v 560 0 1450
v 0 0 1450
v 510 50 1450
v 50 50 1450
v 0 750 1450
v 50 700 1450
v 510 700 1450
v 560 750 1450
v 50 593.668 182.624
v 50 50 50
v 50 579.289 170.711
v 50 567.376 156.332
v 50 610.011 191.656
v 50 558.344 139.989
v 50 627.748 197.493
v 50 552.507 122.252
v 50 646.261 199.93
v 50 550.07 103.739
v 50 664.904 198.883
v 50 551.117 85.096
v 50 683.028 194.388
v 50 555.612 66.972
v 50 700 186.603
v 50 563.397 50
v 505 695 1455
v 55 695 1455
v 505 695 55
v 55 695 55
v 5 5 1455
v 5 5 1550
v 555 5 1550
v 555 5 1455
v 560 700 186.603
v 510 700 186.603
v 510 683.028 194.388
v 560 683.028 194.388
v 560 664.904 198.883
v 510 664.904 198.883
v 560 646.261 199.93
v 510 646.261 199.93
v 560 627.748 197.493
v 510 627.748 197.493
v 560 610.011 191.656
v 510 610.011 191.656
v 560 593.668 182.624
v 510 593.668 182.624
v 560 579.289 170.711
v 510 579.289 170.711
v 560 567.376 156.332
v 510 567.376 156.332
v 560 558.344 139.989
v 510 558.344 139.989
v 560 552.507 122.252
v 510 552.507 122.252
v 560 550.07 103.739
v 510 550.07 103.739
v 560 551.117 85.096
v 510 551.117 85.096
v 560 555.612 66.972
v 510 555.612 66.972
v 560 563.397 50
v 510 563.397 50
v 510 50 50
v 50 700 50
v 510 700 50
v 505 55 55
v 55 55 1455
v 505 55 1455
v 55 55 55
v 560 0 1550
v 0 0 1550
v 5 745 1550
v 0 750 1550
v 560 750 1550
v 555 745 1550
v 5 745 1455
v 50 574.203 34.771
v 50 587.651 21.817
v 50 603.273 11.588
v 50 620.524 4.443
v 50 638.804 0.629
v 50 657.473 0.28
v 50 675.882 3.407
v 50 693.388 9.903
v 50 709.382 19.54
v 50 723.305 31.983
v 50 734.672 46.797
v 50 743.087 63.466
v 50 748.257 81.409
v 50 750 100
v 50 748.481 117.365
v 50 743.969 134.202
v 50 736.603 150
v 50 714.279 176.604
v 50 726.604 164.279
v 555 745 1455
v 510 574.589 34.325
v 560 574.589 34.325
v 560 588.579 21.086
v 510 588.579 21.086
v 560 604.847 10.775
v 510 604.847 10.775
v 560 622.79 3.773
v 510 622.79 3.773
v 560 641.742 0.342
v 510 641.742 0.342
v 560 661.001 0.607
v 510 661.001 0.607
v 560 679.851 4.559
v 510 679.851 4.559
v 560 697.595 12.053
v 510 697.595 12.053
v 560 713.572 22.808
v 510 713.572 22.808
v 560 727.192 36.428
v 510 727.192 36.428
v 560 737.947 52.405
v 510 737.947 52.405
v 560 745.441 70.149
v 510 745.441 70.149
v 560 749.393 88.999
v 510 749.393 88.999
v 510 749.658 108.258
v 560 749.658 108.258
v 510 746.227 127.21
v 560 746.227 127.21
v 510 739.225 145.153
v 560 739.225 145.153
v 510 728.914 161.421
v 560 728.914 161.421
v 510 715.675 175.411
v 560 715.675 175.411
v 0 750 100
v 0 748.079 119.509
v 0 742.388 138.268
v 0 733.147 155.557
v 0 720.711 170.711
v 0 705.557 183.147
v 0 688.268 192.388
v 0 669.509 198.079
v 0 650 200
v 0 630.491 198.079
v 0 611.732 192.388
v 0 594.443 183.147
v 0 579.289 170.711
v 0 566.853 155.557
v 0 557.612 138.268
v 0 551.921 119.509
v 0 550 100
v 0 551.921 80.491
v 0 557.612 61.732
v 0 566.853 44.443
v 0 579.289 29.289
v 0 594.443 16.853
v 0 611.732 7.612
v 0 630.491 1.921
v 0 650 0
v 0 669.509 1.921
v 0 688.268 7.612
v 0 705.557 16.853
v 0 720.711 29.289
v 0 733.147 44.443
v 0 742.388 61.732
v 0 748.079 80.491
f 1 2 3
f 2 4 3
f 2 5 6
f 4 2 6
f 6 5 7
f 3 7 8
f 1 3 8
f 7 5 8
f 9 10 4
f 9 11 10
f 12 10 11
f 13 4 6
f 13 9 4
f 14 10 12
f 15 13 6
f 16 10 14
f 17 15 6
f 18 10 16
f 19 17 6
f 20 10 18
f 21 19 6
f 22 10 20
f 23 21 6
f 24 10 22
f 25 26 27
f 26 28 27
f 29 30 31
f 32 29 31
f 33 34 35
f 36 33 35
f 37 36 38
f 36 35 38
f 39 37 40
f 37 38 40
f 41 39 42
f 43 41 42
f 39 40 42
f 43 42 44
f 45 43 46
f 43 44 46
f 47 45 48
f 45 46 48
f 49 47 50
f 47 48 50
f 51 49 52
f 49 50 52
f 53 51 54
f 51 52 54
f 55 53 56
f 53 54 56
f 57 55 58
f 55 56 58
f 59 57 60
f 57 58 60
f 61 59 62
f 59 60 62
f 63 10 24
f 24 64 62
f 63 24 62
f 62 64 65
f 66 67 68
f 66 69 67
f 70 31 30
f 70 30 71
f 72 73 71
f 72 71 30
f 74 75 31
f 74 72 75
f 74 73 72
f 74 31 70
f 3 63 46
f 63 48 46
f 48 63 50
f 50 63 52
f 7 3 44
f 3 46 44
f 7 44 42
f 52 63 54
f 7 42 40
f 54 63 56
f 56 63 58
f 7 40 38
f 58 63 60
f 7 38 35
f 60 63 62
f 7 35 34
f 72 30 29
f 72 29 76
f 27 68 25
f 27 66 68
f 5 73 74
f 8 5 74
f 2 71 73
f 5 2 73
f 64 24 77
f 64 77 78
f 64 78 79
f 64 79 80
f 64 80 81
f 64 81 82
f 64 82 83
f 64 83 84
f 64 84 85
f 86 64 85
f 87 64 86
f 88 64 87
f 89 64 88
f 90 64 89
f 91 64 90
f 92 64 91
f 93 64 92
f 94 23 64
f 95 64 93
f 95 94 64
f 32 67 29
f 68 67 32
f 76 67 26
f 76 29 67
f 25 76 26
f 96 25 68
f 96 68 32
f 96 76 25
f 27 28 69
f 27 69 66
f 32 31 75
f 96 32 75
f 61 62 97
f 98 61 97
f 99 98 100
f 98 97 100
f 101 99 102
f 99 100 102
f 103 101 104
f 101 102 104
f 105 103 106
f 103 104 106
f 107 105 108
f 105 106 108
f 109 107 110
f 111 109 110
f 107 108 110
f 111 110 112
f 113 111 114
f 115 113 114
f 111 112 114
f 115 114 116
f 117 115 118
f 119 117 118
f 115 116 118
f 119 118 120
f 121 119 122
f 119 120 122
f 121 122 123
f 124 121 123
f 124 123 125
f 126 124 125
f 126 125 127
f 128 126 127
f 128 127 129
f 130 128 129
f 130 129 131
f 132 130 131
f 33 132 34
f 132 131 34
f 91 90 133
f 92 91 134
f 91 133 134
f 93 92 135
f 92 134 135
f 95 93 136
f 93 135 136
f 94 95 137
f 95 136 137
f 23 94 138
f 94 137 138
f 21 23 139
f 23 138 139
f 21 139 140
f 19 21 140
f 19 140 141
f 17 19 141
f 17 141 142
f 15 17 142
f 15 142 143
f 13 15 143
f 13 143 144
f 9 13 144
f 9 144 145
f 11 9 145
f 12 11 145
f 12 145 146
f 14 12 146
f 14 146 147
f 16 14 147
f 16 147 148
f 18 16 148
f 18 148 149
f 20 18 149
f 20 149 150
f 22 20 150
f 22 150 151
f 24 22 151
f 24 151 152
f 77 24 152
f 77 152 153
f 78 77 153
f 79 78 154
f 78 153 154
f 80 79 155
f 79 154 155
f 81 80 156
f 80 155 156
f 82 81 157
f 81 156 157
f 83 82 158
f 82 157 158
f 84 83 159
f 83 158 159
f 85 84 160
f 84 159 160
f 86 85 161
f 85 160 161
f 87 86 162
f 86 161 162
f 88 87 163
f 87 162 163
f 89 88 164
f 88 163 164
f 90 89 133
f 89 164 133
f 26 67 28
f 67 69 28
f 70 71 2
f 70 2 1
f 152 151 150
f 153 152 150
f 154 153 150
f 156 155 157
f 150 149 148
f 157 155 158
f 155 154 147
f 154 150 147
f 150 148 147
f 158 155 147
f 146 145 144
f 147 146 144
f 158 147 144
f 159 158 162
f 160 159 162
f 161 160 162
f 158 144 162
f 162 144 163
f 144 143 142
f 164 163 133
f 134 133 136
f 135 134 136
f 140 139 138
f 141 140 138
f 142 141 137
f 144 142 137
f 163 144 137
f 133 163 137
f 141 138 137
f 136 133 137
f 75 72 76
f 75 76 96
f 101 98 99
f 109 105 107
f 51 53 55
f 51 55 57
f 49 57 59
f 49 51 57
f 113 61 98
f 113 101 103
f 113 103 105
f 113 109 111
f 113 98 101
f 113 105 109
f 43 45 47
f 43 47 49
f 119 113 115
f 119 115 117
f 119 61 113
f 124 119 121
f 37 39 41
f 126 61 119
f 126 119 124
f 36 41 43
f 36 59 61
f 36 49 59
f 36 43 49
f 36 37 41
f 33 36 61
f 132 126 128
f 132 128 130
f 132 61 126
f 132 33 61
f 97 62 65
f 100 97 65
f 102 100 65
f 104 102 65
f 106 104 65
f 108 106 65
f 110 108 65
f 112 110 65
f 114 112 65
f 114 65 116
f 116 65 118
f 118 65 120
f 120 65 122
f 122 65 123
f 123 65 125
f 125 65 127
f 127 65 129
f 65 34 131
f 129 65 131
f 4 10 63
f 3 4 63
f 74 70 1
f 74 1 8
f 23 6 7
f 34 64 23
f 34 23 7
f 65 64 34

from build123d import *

# Parameters (mm, degrees)
F1_W     = 460
F1_H     = 650
F2_DEPTH = 1500
F3_W     = 560
F3_H     = 750
F3_W_2   = 460
F3_H_2   = 650
F4_DEPTH = 100
F5_T     = -5
F6_R     = 100
F7_DEPTH = 50
F9_DEPTH = 50


with BuildPart() as f2:
    # F1 (on offset) → F2 (new body)
    with BuildSketch(Plane.XY.offset(50)):
        with Locations((280, 375)):
            Rectangle(F1_W, F1_H)
    extrude(amount=F2_DEPTH)

    # F3 (on face) → F4 (join)
    with BuildSketch(Plane.XY.offset(1550)):
        with Locations((280, 375)):
            Rectangle(F3_W, F3_H)
        with Locations((280, 375)):
            Rectangle(F3_W_2, F3_H_2, mode=Mode.SUBTRACT)
    extrude(amount=-F4_DEPTH)

    # F5
    f5_openings = [f2.faces().sort_by_distance(p)[0] for p in [
        (280, 375, 1550),
    ]]
    offset(amount=F5_T, openings=f5_openings, kind=Kind.INTERSECTION)

    # F6 (on Right) → F7 (join, through all)
    with BuildSketch(Plane.YZ):
        with Locations((650, 100)):
            Circle(F6_R)
    extrude(amount=F7_DEPTH)

    # F8 (on face) → F9 (join, through all)
    with BuildSketch(Plane.YZ.offset(510)):
        with BuildLine():
            ThreePointArc((563.3974596216, 50), (675.8819045103, 3.4074173711), (750, 100))
            ThreePointArc((750, 100), (736.6025403784, 150), (700, 186.6025403784))
            Line((700, 186.6025403784), (700, 50))
            Line((700, 50), (563.3974596216, 50))
        make_face()
        with BuildLine():
            Line((700, 50), (700, 186.6025403784))
            ThreePointArc((700, 186.6025403784), (579.2893218813, 170.7106781187), (563.3974596216, 50))
            Line((563.3974596216, 50), (700, 50))
        make_face()
    extrude(amount=F9_DEPTH)


solid = f2.part
